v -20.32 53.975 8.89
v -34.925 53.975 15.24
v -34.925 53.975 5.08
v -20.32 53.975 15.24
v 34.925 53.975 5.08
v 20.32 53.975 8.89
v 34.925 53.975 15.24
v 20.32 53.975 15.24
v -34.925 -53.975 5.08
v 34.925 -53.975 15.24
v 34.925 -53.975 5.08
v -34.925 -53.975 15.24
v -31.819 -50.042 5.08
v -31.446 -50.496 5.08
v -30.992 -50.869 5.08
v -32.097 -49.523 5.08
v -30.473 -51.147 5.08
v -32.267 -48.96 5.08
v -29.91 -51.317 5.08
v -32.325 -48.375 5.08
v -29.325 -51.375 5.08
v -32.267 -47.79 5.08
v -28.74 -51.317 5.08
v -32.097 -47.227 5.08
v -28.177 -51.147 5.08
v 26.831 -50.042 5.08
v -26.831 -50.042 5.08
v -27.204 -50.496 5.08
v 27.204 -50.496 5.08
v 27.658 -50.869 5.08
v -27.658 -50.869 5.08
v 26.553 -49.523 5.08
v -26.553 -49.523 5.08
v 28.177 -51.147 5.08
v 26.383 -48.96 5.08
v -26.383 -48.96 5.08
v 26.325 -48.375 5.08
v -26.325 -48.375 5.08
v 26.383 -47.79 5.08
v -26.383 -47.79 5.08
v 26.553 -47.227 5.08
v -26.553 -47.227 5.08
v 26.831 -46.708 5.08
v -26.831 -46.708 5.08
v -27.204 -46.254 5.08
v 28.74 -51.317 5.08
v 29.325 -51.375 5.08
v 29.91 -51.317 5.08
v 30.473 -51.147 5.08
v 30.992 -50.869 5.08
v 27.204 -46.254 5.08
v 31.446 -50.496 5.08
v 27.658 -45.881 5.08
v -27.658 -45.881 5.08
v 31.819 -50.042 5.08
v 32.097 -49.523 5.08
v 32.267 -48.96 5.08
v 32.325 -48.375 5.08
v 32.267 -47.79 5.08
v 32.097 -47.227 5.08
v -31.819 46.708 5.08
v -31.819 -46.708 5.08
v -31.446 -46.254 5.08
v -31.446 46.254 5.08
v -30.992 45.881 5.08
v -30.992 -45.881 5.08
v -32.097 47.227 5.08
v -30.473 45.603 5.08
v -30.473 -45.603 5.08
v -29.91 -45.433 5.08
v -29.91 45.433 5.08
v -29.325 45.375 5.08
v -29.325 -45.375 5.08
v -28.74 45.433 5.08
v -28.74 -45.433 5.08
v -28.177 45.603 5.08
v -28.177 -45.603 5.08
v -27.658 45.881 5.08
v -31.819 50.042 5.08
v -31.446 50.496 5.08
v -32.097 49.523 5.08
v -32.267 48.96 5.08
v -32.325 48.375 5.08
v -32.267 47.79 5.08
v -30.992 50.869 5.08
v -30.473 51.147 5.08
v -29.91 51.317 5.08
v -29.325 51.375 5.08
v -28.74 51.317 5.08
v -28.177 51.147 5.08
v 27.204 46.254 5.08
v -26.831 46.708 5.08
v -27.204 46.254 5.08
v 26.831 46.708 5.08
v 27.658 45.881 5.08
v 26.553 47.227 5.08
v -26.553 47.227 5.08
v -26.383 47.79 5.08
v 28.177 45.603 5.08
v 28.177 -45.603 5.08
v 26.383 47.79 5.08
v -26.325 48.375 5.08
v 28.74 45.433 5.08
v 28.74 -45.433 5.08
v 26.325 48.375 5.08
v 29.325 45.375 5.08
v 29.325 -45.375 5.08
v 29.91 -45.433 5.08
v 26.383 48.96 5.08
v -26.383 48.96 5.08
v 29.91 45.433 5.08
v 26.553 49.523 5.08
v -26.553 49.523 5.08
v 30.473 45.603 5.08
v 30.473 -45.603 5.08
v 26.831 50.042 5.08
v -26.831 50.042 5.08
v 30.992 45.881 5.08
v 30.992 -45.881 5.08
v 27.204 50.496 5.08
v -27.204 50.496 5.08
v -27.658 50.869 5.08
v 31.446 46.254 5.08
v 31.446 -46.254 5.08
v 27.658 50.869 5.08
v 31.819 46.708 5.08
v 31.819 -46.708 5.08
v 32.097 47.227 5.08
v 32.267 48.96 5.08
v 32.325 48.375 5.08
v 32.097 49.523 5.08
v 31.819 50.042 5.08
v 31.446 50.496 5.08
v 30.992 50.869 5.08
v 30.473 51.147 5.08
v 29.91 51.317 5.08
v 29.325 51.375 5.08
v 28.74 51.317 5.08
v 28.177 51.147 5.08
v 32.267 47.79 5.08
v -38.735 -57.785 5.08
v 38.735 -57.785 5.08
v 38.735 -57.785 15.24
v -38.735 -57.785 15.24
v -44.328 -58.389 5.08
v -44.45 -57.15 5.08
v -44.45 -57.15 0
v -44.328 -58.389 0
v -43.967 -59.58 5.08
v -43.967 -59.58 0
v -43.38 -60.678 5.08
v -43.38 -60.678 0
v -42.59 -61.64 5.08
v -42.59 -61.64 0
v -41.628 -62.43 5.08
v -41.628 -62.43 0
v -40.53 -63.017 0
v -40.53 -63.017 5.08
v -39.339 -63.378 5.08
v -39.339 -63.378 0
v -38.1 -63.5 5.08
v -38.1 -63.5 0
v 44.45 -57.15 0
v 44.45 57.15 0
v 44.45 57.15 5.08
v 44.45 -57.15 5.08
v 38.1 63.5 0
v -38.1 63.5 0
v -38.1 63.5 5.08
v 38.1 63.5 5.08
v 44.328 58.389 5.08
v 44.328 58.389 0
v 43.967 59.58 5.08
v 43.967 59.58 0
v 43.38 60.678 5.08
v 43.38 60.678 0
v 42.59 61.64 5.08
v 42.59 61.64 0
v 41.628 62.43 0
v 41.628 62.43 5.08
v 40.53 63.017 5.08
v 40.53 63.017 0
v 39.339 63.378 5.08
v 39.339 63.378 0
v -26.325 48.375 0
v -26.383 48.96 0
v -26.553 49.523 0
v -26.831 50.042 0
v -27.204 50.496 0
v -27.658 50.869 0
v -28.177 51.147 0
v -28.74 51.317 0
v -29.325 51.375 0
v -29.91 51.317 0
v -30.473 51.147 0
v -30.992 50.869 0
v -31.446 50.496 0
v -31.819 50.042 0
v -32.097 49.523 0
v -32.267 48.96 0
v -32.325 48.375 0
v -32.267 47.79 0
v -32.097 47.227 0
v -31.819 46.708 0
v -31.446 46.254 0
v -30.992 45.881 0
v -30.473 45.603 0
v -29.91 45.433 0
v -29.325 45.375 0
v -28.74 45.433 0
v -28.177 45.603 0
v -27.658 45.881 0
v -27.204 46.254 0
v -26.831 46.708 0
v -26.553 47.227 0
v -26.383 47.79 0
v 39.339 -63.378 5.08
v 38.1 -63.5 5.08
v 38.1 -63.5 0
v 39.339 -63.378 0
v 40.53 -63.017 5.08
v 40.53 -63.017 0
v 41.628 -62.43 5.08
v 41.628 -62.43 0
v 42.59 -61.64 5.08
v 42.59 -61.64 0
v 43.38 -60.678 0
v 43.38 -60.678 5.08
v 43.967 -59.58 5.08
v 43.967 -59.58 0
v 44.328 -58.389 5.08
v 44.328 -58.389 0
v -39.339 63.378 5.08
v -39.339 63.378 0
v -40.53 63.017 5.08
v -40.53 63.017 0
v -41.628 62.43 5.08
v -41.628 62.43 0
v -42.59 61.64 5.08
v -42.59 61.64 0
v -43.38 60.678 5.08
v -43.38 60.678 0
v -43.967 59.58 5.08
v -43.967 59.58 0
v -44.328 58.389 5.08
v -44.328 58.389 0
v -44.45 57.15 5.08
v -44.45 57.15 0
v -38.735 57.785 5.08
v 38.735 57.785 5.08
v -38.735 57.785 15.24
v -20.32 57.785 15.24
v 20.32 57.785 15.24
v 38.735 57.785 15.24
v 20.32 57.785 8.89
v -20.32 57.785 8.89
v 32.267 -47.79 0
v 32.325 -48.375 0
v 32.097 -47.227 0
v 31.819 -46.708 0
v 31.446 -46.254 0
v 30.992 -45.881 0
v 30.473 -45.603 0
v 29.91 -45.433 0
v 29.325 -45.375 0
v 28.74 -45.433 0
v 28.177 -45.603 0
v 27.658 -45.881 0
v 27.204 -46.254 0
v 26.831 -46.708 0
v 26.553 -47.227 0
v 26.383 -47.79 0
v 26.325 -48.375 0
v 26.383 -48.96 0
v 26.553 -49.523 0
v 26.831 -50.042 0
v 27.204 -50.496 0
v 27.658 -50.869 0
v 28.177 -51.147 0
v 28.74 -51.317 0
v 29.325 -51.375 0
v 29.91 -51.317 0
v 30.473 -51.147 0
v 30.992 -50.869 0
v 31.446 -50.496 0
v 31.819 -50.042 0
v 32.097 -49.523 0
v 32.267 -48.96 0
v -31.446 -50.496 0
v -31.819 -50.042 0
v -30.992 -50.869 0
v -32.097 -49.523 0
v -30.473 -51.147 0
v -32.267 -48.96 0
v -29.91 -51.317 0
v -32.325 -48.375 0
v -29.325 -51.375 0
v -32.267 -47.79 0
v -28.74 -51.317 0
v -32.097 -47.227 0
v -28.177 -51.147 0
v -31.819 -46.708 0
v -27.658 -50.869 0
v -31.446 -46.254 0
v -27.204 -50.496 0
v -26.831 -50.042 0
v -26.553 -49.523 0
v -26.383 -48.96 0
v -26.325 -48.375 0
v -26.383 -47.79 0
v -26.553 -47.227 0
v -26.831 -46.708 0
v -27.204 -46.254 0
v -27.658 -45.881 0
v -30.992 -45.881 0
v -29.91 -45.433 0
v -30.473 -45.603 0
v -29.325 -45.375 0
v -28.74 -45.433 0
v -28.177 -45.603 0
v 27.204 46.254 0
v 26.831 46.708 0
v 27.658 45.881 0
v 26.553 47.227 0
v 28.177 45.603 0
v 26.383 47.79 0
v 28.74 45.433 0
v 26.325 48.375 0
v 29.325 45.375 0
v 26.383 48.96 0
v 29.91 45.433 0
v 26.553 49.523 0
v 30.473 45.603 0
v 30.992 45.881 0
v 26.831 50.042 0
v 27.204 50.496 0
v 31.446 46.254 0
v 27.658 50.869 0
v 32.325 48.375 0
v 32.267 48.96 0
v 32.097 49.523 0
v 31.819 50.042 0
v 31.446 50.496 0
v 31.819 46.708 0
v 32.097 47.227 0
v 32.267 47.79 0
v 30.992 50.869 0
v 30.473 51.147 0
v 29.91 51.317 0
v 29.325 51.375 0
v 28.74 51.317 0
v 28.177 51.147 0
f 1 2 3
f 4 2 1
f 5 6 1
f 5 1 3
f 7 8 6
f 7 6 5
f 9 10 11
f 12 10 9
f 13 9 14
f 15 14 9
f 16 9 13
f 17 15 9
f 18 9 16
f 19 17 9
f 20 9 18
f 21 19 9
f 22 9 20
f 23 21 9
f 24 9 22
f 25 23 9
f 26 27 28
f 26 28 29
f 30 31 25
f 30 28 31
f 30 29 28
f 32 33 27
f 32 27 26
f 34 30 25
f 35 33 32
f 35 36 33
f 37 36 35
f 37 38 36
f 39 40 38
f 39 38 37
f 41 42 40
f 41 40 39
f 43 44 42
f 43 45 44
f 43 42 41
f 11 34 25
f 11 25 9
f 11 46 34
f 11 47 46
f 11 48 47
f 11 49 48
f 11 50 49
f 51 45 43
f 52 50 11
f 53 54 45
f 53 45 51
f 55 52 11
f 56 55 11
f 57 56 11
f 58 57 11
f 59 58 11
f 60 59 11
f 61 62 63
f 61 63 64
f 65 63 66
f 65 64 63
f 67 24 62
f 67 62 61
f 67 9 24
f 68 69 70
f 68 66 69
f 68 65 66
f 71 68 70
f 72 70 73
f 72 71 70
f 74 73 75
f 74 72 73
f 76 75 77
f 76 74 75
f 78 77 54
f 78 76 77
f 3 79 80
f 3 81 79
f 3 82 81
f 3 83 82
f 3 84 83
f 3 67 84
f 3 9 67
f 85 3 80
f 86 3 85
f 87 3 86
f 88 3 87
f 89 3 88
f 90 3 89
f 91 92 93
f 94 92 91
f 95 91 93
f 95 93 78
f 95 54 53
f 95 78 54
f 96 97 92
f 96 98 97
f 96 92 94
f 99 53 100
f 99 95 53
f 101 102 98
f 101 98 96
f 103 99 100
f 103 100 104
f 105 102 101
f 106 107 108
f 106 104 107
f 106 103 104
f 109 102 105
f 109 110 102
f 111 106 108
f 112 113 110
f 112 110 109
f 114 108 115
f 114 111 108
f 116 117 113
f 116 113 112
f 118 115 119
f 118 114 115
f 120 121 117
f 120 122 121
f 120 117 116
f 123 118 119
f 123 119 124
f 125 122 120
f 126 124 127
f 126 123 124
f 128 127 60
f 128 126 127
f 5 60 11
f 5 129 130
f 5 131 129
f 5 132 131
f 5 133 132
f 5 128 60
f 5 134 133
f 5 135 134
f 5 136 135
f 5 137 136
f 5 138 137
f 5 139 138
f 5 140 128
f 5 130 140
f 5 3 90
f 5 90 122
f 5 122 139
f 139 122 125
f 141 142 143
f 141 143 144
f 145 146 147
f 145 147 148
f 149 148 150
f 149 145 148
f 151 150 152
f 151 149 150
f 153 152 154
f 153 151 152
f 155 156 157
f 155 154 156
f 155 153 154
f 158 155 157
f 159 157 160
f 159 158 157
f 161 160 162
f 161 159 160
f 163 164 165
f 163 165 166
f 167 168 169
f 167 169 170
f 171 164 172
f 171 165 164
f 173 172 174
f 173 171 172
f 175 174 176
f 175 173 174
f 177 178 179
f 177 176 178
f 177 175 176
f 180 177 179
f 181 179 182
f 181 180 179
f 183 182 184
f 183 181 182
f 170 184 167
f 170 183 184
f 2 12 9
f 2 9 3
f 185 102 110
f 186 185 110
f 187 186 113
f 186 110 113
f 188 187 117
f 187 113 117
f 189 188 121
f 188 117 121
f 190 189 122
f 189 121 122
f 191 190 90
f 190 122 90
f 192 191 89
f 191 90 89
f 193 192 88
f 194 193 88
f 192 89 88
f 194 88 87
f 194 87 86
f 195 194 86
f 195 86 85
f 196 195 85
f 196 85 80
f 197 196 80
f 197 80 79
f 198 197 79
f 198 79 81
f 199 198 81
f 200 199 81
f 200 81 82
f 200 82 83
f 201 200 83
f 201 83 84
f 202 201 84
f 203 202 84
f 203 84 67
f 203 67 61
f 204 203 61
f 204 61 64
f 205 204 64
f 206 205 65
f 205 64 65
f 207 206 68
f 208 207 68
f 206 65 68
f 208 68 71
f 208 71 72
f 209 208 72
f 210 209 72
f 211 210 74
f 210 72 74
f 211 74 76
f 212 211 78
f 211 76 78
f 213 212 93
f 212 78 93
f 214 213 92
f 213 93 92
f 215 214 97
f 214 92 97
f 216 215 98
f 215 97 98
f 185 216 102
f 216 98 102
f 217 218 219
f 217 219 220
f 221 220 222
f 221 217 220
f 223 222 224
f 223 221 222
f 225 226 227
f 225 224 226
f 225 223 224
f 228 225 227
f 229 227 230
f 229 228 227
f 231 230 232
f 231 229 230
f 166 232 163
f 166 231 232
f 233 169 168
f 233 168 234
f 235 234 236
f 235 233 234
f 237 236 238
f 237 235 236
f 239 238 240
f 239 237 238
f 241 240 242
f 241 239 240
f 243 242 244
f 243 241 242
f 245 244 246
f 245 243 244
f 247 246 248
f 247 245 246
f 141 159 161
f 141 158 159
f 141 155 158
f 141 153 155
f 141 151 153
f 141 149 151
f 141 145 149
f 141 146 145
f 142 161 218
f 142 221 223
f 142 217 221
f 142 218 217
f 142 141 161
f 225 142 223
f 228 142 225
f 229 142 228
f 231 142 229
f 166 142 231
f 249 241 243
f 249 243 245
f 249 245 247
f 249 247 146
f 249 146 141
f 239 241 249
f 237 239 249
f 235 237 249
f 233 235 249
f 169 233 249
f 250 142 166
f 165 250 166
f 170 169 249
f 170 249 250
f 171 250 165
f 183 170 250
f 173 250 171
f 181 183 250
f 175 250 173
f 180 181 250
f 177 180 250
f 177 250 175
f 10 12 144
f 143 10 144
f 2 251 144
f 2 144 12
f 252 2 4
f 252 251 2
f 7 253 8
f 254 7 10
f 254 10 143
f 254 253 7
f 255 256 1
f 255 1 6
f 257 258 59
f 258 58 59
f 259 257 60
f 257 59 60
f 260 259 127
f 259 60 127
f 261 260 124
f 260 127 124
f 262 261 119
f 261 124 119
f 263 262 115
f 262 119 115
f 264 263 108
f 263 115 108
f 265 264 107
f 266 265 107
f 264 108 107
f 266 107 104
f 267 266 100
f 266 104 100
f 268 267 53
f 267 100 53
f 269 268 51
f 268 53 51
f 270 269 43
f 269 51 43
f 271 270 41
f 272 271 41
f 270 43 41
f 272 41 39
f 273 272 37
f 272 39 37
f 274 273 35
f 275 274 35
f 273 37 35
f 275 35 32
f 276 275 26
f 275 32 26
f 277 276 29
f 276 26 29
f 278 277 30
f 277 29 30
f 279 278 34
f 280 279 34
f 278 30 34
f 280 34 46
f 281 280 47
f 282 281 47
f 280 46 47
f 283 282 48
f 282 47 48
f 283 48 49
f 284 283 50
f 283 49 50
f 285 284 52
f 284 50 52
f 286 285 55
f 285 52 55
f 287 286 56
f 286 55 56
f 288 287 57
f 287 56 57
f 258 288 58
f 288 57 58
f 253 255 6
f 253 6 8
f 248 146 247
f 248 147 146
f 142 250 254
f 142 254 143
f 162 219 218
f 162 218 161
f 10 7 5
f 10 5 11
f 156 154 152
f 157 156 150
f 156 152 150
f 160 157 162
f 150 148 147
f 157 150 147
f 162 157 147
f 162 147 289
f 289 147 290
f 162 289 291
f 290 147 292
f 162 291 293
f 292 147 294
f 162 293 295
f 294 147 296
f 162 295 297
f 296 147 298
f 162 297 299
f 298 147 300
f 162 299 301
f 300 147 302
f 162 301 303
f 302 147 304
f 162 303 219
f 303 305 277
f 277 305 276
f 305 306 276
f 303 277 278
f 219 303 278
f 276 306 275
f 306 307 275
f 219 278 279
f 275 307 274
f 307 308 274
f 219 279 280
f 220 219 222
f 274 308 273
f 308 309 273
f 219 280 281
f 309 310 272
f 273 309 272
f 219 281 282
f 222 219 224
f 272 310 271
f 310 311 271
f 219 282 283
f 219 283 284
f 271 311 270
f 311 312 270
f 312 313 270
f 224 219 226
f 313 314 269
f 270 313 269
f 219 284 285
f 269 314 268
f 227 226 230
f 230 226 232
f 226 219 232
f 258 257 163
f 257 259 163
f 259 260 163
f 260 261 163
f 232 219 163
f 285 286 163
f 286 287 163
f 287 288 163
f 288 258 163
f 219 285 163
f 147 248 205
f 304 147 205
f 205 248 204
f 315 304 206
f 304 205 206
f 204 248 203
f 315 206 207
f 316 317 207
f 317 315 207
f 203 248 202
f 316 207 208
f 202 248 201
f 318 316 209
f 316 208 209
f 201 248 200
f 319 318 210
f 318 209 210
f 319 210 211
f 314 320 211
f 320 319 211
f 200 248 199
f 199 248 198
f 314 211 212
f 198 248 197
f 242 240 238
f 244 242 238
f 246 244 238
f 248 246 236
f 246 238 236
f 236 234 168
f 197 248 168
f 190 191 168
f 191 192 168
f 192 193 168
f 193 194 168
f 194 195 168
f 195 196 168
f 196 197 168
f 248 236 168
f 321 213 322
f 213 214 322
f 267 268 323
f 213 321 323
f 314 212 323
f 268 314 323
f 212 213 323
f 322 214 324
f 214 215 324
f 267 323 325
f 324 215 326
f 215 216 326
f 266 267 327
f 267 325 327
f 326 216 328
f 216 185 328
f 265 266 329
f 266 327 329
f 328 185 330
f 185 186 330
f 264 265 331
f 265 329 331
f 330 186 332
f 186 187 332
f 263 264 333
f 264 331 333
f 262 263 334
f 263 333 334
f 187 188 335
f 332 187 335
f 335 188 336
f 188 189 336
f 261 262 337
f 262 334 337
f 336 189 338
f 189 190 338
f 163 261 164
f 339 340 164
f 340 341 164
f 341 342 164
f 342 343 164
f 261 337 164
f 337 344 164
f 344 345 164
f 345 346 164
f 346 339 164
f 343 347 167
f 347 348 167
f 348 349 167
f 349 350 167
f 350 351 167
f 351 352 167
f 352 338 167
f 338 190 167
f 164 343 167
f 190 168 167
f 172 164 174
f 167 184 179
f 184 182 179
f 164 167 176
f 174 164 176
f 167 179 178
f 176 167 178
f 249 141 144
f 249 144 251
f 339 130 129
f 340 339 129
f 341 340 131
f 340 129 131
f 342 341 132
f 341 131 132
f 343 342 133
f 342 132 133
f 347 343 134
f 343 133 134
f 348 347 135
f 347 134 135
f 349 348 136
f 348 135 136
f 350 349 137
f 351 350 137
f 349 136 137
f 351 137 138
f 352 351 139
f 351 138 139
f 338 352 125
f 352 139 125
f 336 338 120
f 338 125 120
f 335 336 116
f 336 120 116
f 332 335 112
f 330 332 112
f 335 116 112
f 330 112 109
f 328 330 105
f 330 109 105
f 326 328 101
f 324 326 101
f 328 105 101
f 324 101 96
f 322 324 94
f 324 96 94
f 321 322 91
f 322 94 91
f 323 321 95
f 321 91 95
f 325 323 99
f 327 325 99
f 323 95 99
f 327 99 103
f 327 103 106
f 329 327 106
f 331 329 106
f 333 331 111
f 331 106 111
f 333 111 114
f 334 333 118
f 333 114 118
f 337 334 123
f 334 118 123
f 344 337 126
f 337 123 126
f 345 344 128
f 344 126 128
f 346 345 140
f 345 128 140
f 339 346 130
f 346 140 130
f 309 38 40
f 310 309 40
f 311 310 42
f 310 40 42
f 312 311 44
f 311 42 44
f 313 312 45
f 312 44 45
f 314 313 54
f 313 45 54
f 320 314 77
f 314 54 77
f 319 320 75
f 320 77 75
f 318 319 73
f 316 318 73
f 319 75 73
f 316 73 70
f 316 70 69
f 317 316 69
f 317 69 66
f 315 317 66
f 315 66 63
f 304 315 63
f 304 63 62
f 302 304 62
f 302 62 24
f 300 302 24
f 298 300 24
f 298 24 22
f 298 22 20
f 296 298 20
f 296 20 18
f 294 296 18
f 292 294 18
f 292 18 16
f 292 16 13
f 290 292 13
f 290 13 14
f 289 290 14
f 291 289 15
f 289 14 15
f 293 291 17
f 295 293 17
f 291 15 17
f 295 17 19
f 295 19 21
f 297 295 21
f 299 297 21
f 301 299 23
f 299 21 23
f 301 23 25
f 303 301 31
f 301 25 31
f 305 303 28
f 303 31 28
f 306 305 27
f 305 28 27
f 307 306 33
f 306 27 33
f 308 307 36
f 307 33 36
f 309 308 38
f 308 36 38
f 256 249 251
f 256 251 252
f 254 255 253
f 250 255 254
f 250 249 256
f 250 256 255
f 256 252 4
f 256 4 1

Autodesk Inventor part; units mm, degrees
ref_plane "YZ Plane" through (0, 0, 0) normal (1, 0, 0) x (0, 1, 0)
ref_plane "XZ Plane" through (0, 0, 0) normal (0, 1, 0) x (-1, 0, 0)
ref_plane "XY Plane" through (0, 0, 0) normal (0, 0, 1) x (1, 0, 0)
sketch "Sketch1" plane through (0, 0, 0) normal (0, 0, 1) x (1, 0, 0)
  line L0 (-44.45, 63.5) -> (44.45, 63.5)
  line L1 (44.45, 63.5) -> (44.45, -63.5)
  line L2 (44.45, -63.5) -> (-44.45, -63.5)
  line L3 (-44.45, -63.5) -> (-44.45, 63.5)
  line L4 (0, 63.5) -> (0, -63.5) construction
  point P0 (0, 0)
  point P1 (0, 0)
  dimension "d0" = 88.9
  dimension "d1" = 127
extrude "Extrusion1" add sketch "Sketch1" along normal blind 5.08
fillet "Fillet1" radius 6.35 4 edges at (44.45, 63.5, 2.54) (-44.45, 63.5, 2.54) (44.45, -63.5, 2.54) (-44.45, -63.5, 2.54)
sketch "Sketch2" plane through (0, 0, 5.08) normal (0, 0, 1) x (1, 0, 0)
  line L0 (-38.735, 57.785) -> (38.735, 57.785)
  line L1 (38.735, 57.785) -> (38.735, -57.785)
  line L2 (38.735, -57.785) -> (-38.735, -57.785)
  line L3 (-38.735, -57.785) -> (-38.735, 57.785)
  line L4 (38.1, 63.5) -> (-38.1, 63.5) construction
  line L5 (44.45, -57.15) -> (44.45, 57.15) construction
  line L6 (0, 57.785) -> (0, -57.785) construction
  point P0 (0, 0)
  point P1 (0, 0)
  dimension "d5" = 77.47
  dimension "d6" = 115.57
extrude "Extrusion2" add sketch "Sketch2" along normal blind 10.16
sketch "Sketch3" plane through (0, 0, 15.24) normal (0, 0, 1) x (1, 0, 0)
  line L0 (-34.925, 53.975) -> (34.925, 53.975)
  line L1 (34.925, 53.975) -> (34.925, -53.975)
  line L2 (34.925, -53.975) -> (-34.925, -53.975)
  line L3 (-34.925, -53.975) -> (-34.925, 53.975)
  line L4 (0, -53.975) -> (0, 53.975) construction
  line L5 (38.735, 57.785) -> (-38.735, 57.785) projected
  line L6 (-38.735, 57.785) -> (-38.735, -57.785) projected
  point P0 (0, 0)
  point P1 (0, 0)
  dimension "d9" = 3.81
  dimension "d10" = 3.81
extrude "Extrusion3" cut sketch "Sketch3" against normal blind 10.16
sketch "Sketch4" plane through (-38.735, 57.785, 5.08) normal (0, 1, 0) x (1, 0, 0)
  line L0 (77.47, -10.16) -> (0, -10.16) projected
  line L1 (59.055, -10.16) -> (18.415, -10.16)
  line L2 (18.415, -10.16) -> (18.415, -3.81)
  line L3 (18.415, -3.81) -> (59.055, -3.81)
  line L4 (59.055, -3.81) -> (59.055, -10.16)
  point P0 (38.735, 5.08)
  point P1 (38.735, -10.16)
  dimension "d13" = 40.64
  dimension "d14" = 6.35
extrude "Extrusion4" cut sketch "Sketch4" against normal blind 10.16
sketch "Sketch5" plane through (0, 0, 5.08) normal (0, 0, 1) x (1, 0, 0)
  circle A0 centre (-29.325, 48.375) radius 3
  line L0 (20.32, 53.975) -> (-20.32, 53.975) construction
  line L1 (0, 53.975) -> (0, 7.6098) construction
  line L2 (0, 0) -> (12.3821, 0) construction
  line L3 (-34.925, 53.975) -> (-20.32, 53.975) construction
  line L4 (-34.925, -53.975) -> (-34.925, 53.975) construction
  circle A1 centre (29.325, 48.375) radius 3
  circle A2 centre (-29.325, -48.375) radius 3
  circle A3 centre (29.325, -48.375) radius 3
  dimension "d17" = 6
  dimension "d18" = 5.6
  dimension "d19" = 5.6
extrude "Extrusion5" cut sketch "Sketch5" against normal blind 10
properties part number "EnclosureTop"
